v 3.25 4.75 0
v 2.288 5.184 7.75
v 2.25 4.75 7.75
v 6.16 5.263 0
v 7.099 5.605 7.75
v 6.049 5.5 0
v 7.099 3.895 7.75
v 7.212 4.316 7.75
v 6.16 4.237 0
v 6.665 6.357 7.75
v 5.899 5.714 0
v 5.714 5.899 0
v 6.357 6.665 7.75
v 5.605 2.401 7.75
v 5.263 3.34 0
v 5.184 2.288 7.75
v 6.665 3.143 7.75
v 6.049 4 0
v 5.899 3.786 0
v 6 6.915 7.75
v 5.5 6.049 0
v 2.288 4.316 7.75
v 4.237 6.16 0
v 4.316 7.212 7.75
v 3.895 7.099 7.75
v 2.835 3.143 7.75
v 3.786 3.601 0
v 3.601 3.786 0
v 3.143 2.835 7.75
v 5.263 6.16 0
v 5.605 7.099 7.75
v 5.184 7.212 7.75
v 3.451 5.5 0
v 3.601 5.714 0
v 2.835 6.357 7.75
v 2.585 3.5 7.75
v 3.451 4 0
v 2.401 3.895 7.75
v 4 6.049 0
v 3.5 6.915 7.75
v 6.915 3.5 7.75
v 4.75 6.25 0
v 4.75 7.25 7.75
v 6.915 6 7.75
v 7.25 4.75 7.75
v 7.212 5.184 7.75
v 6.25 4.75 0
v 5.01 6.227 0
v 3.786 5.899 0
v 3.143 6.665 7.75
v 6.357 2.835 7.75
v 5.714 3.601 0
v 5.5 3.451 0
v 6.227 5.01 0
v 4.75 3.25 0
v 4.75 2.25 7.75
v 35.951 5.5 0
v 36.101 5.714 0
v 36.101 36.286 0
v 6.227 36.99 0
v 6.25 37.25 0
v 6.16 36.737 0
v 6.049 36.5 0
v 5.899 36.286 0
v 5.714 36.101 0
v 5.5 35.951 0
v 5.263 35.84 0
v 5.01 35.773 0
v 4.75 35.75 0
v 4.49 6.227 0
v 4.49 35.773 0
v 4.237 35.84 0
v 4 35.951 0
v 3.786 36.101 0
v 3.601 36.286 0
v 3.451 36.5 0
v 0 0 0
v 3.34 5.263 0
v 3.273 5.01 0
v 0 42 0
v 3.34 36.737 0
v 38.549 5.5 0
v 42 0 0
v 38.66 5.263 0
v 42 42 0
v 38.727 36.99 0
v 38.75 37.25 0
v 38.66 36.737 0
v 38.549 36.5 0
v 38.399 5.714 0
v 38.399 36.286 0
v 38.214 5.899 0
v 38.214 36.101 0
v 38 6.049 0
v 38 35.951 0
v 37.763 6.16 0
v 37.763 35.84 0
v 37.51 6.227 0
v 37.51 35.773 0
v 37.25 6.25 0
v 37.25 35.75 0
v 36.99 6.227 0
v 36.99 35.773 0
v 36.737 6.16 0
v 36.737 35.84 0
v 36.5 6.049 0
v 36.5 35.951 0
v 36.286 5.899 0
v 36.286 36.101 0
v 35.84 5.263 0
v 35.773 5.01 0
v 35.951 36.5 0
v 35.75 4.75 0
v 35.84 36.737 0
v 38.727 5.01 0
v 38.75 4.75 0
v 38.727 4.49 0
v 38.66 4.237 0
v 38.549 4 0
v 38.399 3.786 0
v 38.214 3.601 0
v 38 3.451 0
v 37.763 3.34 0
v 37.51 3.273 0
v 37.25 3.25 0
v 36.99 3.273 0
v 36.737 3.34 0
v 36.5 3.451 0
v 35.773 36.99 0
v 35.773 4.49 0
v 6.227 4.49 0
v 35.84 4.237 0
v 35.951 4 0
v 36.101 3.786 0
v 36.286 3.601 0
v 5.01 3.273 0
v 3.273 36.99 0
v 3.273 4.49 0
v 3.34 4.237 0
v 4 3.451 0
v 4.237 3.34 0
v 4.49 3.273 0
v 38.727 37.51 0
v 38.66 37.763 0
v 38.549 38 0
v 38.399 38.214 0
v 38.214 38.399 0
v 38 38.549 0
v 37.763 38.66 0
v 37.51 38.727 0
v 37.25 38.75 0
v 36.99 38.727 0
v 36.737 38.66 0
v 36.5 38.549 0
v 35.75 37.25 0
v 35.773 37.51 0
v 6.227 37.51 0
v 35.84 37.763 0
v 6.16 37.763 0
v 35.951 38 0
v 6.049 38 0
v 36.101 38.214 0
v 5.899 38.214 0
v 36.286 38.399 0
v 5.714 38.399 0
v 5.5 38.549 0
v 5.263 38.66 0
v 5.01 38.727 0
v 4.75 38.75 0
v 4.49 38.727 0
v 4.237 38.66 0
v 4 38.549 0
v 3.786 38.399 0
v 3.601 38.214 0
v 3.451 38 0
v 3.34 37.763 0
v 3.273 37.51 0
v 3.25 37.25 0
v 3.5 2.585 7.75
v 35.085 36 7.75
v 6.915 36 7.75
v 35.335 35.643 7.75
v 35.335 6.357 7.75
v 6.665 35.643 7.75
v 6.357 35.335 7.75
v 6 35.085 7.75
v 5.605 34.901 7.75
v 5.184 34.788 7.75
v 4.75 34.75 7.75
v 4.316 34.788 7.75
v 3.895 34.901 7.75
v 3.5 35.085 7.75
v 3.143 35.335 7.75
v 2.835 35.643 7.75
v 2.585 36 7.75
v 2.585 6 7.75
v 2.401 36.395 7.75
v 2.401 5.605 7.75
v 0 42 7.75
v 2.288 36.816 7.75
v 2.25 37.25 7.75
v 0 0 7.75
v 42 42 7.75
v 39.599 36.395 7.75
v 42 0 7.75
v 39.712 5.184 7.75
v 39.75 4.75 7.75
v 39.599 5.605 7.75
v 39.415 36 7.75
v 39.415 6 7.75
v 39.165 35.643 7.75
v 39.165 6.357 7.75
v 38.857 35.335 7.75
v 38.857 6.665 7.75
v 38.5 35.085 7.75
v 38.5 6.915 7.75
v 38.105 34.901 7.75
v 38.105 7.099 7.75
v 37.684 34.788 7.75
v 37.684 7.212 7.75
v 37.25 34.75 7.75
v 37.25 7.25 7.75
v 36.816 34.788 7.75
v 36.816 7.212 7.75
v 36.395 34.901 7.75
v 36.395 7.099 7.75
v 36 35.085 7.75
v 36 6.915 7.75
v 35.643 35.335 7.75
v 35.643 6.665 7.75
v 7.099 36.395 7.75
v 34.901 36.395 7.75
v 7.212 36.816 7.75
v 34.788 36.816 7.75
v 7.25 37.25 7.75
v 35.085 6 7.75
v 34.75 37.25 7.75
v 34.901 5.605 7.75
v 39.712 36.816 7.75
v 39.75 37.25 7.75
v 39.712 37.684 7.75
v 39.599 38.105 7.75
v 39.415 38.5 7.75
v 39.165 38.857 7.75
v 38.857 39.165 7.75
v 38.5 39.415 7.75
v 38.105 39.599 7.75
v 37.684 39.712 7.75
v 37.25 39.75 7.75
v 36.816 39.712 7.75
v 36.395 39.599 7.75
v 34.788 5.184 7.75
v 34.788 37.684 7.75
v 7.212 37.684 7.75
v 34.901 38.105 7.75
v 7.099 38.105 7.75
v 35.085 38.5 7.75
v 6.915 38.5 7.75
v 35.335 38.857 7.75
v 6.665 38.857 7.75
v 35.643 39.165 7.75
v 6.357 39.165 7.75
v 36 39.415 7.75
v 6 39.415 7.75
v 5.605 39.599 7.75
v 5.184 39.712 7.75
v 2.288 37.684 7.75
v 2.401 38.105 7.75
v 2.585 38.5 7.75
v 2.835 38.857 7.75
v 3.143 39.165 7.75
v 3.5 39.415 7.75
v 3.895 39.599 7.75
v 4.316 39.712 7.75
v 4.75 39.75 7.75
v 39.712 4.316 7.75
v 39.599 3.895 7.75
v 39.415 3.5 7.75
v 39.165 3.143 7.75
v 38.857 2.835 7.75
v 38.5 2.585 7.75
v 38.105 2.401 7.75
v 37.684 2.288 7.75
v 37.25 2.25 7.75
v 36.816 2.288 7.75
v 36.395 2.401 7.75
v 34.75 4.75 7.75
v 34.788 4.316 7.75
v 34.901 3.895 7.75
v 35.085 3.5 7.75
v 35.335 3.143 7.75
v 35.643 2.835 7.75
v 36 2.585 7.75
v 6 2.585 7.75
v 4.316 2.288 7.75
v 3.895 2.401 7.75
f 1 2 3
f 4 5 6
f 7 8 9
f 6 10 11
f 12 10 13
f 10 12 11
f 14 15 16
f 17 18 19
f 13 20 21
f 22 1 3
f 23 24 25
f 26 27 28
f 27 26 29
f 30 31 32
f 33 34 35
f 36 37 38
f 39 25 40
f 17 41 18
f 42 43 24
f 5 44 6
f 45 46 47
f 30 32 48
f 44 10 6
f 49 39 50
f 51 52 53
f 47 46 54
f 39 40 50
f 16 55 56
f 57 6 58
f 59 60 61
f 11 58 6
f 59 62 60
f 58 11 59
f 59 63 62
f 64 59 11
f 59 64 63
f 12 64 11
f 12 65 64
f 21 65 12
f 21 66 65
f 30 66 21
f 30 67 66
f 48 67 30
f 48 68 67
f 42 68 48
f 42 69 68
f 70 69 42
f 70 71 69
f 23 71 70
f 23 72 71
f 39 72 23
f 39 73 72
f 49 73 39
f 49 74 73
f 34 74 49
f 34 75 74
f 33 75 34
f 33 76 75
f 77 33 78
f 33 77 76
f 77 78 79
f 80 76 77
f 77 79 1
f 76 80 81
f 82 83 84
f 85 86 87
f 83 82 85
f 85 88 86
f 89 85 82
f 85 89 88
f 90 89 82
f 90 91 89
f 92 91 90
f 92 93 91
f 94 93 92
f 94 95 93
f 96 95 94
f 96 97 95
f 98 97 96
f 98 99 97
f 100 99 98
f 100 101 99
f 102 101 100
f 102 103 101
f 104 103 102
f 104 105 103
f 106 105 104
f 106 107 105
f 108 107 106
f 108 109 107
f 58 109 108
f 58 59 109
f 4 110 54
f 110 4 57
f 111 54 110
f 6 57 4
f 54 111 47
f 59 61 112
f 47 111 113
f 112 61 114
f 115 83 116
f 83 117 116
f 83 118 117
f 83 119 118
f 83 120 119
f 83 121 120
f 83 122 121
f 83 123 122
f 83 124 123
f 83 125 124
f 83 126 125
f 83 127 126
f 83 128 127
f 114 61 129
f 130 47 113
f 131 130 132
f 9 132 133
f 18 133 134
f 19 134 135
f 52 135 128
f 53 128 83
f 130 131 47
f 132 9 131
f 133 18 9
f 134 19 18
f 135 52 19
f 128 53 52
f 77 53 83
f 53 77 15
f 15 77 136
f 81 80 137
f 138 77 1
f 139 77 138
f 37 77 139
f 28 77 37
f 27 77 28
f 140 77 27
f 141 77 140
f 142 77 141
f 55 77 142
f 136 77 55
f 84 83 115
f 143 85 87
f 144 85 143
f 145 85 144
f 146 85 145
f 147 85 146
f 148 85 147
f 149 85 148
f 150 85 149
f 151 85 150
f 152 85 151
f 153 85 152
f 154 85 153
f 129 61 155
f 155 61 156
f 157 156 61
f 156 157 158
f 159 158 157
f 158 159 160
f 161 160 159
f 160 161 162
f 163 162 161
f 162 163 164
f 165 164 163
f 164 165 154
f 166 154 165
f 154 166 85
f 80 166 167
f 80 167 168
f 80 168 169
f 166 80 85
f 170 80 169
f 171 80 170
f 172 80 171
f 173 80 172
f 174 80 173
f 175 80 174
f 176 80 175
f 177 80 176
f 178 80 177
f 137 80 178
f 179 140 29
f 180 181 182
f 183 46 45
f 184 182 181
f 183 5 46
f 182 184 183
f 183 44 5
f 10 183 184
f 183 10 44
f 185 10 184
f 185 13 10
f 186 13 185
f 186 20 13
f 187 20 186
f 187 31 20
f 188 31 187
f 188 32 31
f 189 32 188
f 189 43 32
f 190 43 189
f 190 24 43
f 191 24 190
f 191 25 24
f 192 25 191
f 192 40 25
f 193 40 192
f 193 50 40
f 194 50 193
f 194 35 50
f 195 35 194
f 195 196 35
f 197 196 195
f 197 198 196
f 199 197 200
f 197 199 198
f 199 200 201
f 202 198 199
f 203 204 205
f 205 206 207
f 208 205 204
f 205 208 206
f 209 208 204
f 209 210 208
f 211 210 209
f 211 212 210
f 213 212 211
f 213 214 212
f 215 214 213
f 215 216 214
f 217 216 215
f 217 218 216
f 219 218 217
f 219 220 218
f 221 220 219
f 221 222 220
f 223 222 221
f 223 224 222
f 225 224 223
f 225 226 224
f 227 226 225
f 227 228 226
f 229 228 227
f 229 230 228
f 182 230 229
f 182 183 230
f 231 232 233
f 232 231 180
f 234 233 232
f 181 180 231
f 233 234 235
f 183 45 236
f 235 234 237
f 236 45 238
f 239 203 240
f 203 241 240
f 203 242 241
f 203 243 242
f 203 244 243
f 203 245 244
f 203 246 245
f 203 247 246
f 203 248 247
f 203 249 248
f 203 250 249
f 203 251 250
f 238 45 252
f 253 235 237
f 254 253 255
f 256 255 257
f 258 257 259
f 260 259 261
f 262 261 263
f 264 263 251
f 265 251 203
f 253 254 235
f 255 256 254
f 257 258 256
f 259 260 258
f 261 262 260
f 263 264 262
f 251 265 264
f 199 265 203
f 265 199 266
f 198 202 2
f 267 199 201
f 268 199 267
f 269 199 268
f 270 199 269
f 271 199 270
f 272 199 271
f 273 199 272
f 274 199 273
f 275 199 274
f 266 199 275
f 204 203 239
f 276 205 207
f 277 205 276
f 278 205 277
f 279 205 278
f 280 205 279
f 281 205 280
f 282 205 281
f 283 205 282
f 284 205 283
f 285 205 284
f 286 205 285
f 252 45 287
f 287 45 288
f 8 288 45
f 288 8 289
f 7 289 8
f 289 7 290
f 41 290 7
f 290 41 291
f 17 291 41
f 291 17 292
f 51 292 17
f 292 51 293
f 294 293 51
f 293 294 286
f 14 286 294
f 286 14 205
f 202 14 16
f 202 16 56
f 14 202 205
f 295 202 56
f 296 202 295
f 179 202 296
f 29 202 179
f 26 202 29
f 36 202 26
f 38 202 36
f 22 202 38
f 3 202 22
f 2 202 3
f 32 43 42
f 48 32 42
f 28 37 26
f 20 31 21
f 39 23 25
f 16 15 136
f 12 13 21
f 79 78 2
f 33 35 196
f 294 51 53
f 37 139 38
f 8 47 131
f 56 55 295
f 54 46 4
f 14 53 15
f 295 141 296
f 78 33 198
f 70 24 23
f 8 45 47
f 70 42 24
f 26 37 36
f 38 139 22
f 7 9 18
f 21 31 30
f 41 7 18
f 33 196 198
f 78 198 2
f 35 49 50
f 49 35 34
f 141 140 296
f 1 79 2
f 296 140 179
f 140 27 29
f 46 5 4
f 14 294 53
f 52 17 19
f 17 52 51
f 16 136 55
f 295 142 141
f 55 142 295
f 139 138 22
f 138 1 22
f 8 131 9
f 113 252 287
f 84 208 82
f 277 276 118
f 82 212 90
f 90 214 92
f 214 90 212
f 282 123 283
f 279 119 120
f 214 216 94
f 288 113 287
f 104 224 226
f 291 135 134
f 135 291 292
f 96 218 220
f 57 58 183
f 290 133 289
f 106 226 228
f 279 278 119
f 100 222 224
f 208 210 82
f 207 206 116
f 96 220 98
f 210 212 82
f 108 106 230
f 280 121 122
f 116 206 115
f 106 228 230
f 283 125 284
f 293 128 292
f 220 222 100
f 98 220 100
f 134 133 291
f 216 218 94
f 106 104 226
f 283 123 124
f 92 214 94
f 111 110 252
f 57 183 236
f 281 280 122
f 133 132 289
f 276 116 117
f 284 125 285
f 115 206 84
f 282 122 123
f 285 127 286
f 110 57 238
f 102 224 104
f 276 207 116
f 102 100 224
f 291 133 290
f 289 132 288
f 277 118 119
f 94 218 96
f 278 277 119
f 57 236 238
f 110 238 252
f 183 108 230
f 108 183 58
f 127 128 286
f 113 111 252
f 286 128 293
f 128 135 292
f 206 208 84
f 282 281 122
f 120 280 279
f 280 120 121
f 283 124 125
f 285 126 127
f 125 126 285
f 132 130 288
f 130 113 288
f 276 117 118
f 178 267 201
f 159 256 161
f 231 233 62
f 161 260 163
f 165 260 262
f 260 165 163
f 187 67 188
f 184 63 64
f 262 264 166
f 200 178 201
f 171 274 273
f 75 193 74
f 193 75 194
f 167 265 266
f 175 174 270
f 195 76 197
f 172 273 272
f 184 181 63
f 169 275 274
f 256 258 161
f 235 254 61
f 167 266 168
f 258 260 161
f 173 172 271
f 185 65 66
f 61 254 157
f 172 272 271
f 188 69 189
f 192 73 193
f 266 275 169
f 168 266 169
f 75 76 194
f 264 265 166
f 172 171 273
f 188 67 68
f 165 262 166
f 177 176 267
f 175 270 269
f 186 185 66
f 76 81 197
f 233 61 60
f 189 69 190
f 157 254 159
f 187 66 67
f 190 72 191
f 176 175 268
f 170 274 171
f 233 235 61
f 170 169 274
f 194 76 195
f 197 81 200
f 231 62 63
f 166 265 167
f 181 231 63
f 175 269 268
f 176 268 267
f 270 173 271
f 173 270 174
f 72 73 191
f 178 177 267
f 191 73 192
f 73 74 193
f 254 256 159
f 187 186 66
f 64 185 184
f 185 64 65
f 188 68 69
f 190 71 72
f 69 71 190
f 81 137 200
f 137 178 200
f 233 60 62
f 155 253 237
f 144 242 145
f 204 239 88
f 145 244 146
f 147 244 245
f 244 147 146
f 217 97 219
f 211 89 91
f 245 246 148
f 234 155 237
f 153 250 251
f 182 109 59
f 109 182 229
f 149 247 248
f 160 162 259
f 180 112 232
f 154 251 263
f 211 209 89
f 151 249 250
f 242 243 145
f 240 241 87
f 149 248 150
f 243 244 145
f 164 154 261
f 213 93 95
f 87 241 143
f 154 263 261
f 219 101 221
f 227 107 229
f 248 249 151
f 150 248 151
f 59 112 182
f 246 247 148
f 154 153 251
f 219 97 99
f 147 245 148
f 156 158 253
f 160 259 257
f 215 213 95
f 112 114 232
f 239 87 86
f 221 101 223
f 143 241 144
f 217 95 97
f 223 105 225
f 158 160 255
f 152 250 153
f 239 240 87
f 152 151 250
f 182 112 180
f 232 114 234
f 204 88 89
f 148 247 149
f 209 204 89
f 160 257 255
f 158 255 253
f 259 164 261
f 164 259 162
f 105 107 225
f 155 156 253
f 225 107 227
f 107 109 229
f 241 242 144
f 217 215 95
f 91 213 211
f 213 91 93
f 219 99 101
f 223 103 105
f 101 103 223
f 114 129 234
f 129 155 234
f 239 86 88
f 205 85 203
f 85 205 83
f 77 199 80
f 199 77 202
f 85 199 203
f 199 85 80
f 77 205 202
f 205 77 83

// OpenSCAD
$fn=36;

ls=12.5;
s1=5;
s2=3;
db=9.5;

gs=42;

d=ls-(db/2);
//d=db;

module platte()
{
cube([gs,gs,d]);
}

module schraube()
{
translate([0,0,d])
color("blue")
rotate([0,180,0])
cylinder(h=d, d1=s1, d2=s2);
}
//sx=s1;
sx=db/2;
module schrauben()
{
    translate([sx,sx,0])
    schraube();
    
    translate([gs-sx,sx,0])
    schraube();
    
    translate([sx,gs-sx,0])
    schraube();
    
    translate([gs-sx,gs-sx,0])
    schraube();
}

difference()
{
    platte();
    schrauben();
}
